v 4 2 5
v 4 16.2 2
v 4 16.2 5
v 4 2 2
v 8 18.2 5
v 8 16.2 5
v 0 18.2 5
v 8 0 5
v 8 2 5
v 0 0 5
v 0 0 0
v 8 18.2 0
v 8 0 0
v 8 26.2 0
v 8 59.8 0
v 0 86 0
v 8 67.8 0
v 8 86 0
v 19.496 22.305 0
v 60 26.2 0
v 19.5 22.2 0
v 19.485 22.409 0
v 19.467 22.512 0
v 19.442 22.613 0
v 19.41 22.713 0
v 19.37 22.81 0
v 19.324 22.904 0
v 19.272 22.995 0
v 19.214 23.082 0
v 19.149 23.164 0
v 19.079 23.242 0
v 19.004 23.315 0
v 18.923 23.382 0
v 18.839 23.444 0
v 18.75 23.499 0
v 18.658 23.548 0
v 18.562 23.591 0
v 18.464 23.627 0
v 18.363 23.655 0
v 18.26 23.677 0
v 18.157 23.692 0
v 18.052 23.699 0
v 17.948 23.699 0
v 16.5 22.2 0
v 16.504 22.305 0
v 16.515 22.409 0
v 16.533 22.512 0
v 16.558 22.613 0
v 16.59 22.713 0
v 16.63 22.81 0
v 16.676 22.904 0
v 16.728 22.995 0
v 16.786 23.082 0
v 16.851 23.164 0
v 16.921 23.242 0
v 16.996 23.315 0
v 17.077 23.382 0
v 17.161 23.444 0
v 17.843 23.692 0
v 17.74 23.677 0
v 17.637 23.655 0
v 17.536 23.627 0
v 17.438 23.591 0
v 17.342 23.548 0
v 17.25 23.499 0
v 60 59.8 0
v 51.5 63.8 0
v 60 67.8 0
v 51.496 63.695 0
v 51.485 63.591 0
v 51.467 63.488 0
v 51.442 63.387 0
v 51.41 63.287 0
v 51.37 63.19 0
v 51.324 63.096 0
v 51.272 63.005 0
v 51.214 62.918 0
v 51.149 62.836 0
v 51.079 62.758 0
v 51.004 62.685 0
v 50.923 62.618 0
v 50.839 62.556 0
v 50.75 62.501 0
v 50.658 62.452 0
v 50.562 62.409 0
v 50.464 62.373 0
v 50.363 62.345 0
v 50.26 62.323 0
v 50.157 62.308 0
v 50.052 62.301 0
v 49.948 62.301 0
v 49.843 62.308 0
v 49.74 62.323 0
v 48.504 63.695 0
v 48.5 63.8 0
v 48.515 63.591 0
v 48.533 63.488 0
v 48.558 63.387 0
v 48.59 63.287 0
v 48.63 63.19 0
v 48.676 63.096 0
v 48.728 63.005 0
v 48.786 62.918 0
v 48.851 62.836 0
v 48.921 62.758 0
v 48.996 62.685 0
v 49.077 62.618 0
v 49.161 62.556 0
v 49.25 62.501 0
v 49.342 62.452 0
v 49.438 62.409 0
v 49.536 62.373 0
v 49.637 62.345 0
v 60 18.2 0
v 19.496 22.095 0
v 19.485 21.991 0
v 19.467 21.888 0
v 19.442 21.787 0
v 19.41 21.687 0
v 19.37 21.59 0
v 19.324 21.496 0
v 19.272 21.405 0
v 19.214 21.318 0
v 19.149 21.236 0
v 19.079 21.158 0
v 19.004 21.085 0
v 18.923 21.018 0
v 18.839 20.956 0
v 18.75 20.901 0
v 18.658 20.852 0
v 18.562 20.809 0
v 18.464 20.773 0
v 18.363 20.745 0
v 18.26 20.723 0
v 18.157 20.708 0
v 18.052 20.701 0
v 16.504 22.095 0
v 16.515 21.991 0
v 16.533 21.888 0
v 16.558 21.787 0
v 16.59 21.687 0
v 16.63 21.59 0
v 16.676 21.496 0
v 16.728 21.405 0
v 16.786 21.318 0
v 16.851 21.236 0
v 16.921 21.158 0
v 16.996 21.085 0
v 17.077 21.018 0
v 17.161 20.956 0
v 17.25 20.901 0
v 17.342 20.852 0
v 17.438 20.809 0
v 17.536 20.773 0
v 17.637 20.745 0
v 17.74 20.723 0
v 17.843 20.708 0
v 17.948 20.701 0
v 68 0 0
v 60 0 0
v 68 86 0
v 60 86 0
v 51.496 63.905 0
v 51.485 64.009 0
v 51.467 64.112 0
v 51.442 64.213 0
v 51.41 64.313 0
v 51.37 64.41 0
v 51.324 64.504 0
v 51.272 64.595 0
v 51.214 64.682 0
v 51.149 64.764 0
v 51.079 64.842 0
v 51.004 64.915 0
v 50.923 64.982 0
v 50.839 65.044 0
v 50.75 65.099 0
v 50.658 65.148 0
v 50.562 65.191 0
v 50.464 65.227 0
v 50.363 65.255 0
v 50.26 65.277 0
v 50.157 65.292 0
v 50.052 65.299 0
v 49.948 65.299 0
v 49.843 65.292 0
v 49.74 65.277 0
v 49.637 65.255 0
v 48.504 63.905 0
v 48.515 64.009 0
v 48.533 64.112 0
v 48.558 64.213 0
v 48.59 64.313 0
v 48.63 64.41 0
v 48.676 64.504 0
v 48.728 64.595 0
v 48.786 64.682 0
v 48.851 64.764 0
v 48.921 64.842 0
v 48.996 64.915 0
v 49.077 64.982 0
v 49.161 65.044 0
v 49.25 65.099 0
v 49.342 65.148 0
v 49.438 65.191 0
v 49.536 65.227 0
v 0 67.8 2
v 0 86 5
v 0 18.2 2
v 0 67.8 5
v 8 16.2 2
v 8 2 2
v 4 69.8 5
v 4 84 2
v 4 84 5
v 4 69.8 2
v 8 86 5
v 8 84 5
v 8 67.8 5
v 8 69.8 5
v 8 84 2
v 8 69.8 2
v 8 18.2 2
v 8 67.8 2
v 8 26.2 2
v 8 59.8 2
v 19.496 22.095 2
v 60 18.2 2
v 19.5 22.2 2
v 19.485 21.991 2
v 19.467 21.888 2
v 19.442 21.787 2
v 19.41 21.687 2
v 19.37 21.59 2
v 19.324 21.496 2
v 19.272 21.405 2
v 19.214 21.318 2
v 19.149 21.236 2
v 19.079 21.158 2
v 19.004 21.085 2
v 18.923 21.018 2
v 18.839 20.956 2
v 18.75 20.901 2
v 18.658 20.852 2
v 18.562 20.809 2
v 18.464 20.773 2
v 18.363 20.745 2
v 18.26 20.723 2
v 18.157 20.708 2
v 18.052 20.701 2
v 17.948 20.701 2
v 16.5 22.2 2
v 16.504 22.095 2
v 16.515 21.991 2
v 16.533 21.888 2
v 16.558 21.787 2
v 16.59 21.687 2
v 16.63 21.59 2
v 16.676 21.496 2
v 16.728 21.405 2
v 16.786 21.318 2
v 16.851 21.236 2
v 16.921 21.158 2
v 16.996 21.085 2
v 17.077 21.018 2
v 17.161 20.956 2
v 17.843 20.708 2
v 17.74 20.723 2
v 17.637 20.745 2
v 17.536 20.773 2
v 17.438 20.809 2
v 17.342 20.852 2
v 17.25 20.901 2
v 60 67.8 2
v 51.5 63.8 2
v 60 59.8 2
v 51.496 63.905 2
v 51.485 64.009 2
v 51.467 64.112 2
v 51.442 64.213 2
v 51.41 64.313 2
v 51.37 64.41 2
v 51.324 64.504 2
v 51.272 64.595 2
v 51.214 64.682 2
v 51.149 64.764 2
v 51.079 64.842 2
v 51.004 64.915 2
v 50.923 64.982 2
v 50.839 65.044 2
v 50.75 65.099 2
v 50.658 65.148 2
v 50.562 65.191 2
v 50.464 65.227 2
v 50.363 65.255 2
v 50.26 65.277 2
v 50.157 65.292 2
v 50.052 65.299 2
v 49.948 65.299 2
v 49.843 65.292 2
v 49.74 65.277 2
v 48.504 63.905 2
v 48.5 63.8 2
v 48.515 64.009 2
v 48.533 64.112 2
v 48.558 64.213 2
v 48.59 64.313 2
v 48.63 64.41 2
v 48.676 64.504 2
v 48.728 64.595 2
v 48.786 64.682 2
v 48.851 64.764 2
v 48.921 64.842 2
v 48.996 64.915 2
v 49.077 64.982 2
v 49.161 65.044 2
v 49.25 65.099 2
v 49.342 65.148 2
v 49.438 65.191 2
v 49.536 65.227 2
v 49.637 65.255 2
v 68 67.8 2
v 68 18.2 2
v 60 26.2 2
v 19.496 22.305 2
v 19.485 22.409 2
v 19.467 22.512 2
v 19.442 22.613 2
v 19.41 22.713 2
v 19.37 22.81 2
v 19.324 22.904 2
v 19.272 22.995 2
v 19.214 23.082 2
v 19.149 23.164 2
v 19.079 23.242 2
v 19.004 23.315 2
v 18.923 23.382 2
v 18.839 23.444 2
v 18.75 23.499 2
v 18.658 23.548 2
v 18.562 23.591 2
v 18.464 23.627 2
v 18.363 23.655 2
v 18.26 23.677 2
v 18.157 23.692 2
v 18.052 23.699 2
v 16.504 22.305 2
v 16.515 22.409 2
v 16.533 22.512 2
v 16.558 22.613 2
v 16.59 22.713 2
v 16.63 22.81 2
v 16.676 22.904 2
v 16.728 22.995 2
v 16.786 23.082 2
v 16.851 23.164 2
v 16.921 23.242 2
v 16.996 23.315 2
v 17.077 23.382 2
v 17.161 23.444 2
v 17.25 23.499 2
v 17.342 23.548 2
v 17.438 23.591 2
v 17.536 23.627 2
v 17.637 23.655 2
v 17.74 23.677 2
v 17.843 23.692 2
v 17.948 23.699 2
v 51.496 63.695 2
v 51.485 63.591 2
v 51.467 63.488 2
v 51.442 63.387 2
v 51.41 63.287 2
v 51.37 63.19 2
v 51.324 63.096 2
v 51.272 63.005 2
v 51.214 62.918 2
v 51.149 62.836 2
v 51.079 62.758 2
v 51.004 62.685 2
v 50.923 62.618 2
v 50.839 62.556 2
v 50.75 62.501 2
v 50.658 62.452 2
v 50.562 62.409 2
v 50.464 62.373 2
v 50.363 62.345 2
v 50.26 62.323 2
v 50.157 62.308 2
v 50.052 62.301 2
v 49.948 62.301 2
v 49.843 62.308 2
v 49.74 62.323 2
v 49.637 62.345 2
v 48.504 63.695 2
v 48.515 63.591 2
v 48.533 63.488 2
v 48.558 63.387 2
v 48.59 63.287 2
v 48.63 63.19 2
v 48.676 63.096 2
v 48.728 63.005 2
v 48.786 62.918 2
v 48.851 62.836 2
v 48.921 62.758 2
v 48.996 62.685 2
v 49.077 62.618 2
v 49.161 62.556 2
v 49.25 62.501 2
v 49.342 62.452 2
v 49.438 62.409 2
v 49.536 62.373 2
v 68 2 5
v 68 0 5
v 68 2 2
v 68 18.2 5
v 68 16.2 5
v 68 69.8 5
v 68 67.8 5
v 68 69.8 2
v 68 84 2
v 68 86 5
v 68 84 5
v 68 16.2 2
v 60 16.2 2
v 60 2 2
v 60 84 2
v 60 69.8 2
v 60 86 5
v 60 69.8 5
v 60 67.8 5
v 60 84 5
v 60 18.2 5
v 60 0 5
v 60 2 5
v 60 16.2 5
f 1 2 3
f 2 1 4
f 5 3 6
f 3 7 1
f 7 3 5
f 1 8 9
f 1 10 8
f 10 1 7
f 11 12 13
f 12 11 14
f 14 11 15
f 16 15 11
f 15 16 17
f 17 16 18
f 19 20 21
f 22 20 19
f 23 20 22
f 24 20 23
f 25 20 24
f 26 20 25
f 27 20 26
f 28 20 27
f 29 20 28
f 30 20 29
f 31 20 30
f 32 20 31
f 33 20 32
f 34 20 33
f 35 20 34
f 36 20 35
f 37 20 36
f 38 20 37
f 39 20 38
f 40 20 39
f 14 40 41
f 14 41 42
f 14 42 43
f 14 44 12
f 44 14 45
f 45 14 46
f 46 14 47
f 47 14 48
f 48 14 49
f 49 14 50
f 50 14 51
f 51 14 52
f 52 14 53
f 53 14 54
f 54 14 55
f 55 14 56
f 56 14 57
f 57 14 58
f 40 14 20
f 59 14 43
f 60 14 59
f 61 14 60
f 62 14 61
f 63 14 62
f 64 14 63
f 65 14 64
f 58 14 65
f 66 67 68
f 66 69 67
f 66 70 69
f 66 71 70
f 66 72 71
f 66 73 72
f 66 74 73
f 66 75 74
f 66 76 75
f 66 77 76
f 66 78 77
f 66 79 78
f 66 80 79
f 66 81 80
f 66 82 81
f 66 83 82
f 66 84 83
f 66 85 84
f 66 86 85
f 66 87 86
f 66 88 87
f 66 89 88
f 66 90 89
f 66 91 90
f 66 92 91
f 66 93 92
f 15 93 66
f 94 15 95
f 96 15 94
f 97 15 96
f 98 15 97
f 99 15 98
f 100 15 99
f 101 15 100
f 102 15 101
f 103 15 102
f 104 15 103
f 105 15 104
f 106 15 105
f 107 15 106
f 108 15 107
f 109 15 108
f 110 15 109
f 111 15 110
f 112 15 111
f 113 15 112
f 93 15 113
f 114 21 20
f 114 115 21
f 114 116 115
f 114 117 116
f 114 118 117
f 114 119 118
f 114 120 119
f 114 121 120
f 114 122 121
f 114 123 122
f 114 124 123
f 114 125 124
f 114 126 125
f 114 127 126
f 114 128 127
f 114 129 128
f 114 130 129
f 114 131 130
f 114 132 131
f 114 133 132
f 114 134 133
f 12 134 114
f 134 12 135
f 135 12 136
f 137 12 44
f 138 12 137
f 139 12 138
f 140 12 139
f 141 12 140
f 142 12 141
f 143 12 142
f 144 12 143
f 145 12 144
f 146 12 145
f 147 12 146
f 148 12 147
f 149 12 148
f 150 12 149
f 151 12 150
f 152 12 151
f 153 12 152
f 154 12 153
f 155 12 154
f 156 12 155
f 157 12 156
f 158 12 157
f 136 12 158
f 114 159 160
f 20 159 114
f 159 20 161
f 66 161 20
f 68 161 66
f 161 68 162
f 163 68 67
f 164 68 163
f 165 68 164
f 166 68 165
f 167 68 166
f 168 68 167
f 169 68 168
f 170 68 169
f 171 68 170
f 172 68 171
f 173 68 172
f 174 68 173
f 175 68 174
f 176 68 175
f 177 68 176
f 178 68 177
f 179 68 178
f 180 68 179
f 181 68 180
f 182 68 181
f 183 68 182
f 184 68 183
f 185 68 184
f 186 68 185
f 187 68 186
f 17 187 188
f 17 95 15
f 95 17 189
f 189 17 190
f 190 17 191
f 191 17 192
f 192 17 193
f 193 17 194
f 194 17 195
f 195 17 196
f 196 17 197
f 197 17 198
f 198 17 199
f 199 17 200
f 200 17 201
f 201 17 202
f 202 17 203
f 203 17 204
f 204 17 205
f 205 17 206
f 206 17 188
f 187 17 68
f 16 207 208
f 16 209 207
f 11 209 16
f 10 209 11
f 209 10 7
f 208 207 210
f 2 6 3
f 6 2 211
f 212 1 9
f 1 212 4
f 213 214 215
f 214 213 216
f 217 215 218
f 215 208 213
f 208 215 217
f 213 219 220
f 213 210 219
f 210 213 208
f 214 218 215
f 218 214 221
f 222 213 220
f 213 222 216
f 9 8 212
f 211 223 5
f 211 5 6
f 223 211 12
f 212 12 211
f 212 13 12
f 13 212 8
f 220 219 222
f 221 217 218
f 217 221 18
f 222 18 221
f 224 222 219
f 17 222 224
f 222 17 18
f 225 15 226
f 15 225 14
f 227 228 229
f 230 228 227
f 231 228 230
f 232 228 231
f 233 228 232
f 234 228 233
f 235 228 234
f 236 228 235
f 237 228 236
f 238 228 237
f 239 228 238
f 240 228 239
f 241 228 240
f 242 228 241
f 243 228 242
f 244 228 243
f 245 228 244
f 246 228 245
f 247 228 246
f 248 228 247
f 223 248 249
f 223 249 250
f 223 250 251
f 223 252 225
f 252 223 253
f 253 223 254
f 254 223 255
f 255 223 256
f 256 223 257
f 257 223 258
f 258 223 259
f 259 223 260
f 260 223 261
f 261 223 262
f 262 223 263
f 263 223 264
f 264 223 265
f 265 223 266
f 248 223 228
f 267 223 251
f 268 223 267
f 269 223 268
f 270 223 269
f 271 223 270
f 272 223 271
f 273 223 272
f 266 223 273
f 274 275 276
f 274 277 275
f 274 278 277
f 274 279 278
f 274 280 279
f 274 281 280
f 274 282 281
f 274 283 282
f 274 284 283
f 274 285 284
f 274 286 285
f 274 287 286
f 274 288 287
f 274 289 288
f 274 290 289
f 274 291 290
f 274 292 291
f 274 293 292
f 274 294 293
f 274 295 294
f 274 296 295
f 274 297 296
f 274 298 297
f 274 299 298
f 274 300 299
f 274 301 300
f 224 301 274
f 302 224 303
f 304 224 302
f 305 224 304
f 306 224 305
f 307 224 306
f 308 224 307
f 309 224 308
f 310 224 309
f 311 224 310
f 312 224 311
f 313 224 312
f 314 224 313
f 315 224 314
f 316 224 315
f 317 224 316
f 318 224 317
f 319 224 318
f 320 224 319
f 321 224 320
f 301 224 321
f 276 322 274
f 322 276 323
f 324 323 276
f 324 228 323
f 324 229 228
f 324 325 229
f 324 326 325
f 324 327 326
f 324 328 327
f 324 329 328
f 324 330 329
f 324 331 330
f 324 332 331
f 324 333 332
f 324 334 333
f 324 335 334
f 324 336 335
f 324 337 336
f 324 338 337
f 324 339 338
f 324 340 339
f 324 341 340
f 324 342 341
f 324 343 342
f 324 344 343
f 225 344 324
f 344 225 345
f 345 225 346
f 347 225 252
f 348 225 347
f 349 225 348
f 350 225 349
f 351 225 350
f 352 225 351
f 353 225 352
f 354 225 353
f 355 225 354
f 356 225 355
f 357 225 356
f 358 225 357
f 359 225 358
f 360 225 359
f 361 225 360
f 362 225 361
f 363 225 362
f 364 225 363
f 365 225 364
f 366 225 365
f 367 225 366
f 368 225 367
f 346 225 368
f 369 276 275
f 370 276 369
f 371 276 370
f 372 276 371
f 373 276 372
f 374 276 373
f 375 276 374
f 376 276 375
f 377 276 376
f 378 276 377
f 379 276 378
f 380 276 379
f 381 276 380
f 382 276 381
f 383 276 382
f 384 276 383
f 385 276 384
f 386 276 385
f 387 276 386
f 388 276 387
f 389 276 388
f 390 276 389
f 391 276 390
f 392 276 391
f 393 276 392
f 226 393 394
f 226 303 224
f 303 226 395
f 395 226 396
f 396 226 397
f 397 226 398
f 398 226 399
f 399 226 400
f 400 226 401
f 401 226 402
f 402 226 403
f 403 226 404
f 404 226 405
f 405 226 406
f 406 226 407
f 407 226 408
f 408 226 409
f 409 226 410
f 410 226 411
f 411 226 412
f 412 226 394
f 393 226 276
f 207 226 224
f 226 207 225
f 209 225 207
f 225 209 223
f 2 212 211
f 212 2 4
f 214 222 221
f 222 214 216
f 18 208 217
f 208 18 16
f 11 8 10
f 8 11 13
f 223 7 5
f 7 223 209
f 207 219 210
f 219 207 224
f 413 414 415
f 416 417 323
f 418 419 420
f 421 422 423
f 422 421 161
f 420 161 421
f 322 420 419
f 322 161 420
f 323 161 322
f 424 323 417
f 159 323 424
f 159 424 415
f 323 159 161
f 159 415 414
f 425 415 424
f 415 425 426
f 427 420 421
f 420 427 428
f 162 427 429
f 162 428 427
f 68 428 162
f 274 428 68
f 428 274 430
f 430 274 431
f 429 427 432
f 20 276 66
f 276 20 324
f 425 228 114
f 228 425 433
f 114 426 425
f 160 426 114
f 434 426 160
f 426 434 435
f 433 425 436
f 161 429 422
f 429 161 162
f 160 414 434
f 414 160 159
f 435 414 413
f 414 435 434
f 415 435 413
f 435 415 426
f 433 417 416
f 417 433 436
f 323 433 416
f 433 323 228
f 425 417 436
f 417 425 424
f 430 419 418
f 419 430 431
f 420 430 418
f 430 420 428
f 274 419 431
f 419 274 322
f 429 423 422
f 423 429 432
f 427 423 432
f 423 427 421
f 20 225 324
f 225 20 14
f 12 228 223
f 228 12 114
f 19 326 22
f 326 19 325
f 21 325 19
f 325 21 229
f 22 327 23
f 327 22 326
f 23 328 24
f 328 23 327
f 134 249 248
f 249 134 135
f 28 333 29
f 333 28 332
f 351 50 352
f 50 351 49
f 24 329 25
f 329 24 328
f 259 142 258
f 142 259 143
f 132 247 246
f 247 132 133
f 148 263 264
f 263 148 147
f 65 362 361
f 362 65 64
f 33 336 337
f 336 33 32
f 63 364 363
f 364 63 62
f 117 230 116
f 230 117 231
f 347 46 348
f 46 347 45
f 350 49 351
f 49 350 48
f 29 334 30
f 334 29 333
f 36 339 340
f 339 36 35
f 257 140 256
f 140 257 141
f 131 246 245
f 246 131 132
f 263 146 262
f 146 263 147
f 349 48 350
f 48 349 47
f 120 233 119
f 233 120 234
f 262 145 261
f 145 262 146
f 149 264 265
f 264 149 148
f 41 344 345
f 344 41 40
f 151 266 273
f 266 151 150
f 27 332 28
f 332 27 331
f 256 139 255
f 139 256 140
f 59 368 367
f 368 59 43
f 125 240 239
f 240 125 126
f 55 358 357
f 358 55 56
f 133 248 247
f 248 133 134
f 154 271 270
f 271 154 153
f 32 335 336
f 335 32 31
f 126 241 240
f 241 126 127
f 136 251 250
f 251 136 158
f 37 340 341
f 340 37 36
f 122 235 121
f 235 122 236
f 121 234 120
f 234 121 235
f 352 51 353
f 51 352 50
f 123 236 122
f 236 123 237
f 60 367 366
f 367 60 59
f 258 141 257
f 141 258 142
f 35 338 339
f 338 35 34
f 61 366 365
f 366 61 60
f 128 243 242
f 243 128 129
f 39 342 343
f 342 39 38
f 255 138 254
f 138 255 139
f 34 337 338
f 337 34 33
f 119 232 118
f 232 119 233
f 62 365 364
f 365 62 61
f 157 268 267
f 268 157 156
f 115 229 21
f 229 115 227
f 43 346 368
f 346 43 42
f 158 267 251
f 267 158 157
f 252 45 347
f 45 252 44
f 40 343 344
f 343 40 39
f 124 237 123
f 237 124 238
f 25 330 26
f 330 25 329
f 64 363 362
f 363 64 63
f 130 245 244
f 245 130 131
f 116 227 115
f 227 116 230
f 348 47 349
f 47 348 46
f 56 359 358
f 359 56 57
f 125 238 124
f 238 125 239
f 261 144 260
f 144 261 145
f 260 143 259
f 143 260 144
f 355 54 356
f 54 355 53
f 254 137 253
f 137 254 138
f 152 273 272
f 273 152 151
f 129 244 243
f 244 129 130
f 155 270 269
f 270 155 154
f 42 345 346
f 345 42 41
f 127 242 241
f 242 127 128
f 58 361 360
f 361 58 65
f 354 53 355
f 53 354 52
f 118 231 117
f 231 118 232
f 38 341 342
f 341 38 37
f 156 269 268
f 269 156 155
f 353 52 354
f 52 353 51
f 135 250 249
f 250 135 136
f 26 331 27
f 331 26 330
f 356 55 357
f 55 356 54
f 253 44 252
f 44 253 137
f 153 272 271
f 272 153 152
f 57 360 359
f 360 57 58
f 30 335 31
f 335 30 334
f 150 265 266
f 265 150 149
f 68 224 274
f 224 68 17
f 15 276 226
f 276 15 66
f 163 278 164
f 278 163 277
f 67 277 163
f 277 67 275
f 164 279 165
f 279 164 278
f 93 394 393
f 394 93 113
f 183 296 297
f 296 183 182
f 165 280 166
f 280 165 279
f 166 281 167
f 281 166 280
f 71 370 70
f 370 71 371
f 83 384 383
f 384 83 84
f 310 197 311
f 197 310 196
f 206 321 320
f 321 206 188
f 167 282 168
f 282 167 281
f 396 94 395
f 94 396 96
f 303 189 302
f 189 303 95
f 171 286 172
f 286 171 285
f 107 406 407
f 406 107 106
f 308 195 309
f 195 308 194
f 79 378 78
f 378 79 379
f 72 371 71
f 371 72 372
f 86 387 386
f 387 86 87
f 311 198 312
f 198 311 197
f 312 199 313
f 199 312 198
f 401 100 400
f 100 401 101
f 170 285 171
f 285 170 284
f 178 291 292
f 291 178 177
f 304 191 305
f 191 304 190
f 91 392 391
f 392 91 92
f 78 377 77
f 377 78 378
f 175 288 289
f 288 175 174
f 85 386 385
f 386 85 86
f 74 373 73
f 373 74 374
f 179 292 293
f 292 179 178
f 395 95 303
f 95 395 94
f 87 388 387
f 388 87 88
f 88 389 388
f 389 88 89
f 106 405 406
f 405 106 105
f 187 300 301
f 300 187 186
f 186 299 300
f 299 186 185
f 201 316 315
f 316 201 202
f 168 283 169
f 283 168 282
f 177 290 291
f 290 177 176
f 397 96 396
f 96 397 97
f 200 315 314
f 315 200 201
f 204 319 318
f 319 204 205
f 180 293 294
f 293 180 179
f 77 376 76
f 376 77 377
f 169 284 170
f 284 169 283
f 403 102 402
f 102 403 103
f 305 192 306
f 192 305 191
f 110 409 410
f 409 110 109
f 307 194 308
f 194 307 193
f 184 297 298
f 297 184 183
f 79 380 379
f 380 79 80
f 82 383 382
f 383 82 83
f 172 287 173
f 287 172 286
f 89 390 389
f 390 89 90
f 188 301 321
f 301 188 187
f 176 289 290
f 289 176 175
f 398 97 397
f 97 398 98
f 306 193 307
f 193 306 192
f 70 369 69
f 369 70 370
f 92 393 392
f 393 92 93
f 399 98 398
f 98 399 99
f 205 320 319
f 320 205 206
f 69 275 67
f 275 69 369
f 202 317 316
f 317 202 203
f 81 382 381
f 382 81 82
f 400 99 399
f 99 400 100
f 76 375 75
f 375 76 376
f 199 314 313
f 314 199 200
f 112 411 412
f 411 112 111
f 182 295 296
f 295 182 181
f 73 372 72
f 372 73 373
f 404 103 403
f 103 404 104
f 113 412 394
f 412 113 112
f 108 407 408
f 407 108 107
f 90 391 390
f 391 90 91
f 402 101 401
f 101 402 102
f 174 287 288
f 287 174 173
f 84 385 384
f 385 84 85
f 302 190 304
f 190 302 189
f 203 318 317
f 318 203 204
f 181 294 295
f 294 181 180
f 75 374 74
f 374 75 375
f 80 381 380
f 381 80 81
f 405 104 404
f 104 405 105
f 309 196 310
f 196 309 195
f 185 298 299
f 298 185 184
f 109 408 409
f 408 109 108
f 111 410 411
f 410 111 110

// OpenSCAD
/*
 * Prusament Spool Holder Rail
 *
 * Author: Pavel Rampas
 * Version: 1.0.0 (Changelog is at the bottom)
 * License: CC BY-SA 4.0 [https://creativecommons.org/licenses/by-sa/4.0/]
 * Link: https://github.com/pavelrampas/openscad-models
 *
 * OpenSCAD version: 2019.05
 *
 * Instructions:
 * Set up parameters, render and print.
 *
 * Height is layer.
 * Thickness is perimeter.
 */

// Parameters
//------------------------------------------------------------------------------

$fn = $preview ? 15 : 90;

bottomThickness = 8;
bottomHeight = 2;

teethThickness = 2;
teethHeight = bottomHeight + 3;

width = 86;
length = 52 + bottomThickness;

holderWidth = 14.2;
holderRailHoleSize = 4;

holeD = 3;

// Code
//------------------------------------------------------------------------------

_rail();
translate([length, 0, 0]) {
    _rail(false);
}

difference() {
    translate([0, holderWidth + (2 * teethThickness), 0]) {
        cube([length, bottomThickness, bottomHeight], false);
    }
    translate([
        bottomThickness + 10,
        holderWidth + (2 * teethThickness) + (bottomThickness / 2),
        0
    ]) {
        cylinder(h = bottomHeight, d = holeD);
    }
}

difference() {
    translate(
        [0, width - holderWidth - (2 * teethThickness) - bottomThickness, 0]
    ) {
        cube([length, bottomThickness, bottomHeight], false);
    }
    translate([
        length - 10,
        width - holderWidth - (2 * teethThickness) - (bottomThickness / 2),
        0
    ]) {
        cylinder(h = bottomHeight, d = holeD);
    }
}

// Functions
//------------------------------------------------------------------------------


// Modules
//------------------------------------------------------------------------------

module _rail(holder = true) {
    // bottom
    cube([bottomThickness, width, bottomHeight], false);

    // teeth
    cube([bottomThickness, teethThickness, teethHeight], false);
    translate([0, holderWidth + teethThickness, 0]) {
        cube([bottomThickness, teethThickness, teethHeight], false);
    }
    translate([0, width - holderWidth - (2 * teethThickness), 0]) {
        cube([bottomThickness, teethThickness, teethHeight], false);
    }
    translate([0, width - teethThickness, 0]) {
        cube([bottomThickness, teethThickness, teethHeight], false);
    }

    // holder
    if (holder) {
        translate([0, teethThickness, 0]) {
            cube([holderRailHoleSize, holderWidth, teethHeight], false);
        }
        translate([0, width - holderWidth - teethThickness, 0]) {
            cube([holderRailHoleSize, holderWidth, teethHeight], false);
        }
    }
}

// Changelog
//------------------------------------------------------------------------------

// [1.0.0]:
// Initial release.
